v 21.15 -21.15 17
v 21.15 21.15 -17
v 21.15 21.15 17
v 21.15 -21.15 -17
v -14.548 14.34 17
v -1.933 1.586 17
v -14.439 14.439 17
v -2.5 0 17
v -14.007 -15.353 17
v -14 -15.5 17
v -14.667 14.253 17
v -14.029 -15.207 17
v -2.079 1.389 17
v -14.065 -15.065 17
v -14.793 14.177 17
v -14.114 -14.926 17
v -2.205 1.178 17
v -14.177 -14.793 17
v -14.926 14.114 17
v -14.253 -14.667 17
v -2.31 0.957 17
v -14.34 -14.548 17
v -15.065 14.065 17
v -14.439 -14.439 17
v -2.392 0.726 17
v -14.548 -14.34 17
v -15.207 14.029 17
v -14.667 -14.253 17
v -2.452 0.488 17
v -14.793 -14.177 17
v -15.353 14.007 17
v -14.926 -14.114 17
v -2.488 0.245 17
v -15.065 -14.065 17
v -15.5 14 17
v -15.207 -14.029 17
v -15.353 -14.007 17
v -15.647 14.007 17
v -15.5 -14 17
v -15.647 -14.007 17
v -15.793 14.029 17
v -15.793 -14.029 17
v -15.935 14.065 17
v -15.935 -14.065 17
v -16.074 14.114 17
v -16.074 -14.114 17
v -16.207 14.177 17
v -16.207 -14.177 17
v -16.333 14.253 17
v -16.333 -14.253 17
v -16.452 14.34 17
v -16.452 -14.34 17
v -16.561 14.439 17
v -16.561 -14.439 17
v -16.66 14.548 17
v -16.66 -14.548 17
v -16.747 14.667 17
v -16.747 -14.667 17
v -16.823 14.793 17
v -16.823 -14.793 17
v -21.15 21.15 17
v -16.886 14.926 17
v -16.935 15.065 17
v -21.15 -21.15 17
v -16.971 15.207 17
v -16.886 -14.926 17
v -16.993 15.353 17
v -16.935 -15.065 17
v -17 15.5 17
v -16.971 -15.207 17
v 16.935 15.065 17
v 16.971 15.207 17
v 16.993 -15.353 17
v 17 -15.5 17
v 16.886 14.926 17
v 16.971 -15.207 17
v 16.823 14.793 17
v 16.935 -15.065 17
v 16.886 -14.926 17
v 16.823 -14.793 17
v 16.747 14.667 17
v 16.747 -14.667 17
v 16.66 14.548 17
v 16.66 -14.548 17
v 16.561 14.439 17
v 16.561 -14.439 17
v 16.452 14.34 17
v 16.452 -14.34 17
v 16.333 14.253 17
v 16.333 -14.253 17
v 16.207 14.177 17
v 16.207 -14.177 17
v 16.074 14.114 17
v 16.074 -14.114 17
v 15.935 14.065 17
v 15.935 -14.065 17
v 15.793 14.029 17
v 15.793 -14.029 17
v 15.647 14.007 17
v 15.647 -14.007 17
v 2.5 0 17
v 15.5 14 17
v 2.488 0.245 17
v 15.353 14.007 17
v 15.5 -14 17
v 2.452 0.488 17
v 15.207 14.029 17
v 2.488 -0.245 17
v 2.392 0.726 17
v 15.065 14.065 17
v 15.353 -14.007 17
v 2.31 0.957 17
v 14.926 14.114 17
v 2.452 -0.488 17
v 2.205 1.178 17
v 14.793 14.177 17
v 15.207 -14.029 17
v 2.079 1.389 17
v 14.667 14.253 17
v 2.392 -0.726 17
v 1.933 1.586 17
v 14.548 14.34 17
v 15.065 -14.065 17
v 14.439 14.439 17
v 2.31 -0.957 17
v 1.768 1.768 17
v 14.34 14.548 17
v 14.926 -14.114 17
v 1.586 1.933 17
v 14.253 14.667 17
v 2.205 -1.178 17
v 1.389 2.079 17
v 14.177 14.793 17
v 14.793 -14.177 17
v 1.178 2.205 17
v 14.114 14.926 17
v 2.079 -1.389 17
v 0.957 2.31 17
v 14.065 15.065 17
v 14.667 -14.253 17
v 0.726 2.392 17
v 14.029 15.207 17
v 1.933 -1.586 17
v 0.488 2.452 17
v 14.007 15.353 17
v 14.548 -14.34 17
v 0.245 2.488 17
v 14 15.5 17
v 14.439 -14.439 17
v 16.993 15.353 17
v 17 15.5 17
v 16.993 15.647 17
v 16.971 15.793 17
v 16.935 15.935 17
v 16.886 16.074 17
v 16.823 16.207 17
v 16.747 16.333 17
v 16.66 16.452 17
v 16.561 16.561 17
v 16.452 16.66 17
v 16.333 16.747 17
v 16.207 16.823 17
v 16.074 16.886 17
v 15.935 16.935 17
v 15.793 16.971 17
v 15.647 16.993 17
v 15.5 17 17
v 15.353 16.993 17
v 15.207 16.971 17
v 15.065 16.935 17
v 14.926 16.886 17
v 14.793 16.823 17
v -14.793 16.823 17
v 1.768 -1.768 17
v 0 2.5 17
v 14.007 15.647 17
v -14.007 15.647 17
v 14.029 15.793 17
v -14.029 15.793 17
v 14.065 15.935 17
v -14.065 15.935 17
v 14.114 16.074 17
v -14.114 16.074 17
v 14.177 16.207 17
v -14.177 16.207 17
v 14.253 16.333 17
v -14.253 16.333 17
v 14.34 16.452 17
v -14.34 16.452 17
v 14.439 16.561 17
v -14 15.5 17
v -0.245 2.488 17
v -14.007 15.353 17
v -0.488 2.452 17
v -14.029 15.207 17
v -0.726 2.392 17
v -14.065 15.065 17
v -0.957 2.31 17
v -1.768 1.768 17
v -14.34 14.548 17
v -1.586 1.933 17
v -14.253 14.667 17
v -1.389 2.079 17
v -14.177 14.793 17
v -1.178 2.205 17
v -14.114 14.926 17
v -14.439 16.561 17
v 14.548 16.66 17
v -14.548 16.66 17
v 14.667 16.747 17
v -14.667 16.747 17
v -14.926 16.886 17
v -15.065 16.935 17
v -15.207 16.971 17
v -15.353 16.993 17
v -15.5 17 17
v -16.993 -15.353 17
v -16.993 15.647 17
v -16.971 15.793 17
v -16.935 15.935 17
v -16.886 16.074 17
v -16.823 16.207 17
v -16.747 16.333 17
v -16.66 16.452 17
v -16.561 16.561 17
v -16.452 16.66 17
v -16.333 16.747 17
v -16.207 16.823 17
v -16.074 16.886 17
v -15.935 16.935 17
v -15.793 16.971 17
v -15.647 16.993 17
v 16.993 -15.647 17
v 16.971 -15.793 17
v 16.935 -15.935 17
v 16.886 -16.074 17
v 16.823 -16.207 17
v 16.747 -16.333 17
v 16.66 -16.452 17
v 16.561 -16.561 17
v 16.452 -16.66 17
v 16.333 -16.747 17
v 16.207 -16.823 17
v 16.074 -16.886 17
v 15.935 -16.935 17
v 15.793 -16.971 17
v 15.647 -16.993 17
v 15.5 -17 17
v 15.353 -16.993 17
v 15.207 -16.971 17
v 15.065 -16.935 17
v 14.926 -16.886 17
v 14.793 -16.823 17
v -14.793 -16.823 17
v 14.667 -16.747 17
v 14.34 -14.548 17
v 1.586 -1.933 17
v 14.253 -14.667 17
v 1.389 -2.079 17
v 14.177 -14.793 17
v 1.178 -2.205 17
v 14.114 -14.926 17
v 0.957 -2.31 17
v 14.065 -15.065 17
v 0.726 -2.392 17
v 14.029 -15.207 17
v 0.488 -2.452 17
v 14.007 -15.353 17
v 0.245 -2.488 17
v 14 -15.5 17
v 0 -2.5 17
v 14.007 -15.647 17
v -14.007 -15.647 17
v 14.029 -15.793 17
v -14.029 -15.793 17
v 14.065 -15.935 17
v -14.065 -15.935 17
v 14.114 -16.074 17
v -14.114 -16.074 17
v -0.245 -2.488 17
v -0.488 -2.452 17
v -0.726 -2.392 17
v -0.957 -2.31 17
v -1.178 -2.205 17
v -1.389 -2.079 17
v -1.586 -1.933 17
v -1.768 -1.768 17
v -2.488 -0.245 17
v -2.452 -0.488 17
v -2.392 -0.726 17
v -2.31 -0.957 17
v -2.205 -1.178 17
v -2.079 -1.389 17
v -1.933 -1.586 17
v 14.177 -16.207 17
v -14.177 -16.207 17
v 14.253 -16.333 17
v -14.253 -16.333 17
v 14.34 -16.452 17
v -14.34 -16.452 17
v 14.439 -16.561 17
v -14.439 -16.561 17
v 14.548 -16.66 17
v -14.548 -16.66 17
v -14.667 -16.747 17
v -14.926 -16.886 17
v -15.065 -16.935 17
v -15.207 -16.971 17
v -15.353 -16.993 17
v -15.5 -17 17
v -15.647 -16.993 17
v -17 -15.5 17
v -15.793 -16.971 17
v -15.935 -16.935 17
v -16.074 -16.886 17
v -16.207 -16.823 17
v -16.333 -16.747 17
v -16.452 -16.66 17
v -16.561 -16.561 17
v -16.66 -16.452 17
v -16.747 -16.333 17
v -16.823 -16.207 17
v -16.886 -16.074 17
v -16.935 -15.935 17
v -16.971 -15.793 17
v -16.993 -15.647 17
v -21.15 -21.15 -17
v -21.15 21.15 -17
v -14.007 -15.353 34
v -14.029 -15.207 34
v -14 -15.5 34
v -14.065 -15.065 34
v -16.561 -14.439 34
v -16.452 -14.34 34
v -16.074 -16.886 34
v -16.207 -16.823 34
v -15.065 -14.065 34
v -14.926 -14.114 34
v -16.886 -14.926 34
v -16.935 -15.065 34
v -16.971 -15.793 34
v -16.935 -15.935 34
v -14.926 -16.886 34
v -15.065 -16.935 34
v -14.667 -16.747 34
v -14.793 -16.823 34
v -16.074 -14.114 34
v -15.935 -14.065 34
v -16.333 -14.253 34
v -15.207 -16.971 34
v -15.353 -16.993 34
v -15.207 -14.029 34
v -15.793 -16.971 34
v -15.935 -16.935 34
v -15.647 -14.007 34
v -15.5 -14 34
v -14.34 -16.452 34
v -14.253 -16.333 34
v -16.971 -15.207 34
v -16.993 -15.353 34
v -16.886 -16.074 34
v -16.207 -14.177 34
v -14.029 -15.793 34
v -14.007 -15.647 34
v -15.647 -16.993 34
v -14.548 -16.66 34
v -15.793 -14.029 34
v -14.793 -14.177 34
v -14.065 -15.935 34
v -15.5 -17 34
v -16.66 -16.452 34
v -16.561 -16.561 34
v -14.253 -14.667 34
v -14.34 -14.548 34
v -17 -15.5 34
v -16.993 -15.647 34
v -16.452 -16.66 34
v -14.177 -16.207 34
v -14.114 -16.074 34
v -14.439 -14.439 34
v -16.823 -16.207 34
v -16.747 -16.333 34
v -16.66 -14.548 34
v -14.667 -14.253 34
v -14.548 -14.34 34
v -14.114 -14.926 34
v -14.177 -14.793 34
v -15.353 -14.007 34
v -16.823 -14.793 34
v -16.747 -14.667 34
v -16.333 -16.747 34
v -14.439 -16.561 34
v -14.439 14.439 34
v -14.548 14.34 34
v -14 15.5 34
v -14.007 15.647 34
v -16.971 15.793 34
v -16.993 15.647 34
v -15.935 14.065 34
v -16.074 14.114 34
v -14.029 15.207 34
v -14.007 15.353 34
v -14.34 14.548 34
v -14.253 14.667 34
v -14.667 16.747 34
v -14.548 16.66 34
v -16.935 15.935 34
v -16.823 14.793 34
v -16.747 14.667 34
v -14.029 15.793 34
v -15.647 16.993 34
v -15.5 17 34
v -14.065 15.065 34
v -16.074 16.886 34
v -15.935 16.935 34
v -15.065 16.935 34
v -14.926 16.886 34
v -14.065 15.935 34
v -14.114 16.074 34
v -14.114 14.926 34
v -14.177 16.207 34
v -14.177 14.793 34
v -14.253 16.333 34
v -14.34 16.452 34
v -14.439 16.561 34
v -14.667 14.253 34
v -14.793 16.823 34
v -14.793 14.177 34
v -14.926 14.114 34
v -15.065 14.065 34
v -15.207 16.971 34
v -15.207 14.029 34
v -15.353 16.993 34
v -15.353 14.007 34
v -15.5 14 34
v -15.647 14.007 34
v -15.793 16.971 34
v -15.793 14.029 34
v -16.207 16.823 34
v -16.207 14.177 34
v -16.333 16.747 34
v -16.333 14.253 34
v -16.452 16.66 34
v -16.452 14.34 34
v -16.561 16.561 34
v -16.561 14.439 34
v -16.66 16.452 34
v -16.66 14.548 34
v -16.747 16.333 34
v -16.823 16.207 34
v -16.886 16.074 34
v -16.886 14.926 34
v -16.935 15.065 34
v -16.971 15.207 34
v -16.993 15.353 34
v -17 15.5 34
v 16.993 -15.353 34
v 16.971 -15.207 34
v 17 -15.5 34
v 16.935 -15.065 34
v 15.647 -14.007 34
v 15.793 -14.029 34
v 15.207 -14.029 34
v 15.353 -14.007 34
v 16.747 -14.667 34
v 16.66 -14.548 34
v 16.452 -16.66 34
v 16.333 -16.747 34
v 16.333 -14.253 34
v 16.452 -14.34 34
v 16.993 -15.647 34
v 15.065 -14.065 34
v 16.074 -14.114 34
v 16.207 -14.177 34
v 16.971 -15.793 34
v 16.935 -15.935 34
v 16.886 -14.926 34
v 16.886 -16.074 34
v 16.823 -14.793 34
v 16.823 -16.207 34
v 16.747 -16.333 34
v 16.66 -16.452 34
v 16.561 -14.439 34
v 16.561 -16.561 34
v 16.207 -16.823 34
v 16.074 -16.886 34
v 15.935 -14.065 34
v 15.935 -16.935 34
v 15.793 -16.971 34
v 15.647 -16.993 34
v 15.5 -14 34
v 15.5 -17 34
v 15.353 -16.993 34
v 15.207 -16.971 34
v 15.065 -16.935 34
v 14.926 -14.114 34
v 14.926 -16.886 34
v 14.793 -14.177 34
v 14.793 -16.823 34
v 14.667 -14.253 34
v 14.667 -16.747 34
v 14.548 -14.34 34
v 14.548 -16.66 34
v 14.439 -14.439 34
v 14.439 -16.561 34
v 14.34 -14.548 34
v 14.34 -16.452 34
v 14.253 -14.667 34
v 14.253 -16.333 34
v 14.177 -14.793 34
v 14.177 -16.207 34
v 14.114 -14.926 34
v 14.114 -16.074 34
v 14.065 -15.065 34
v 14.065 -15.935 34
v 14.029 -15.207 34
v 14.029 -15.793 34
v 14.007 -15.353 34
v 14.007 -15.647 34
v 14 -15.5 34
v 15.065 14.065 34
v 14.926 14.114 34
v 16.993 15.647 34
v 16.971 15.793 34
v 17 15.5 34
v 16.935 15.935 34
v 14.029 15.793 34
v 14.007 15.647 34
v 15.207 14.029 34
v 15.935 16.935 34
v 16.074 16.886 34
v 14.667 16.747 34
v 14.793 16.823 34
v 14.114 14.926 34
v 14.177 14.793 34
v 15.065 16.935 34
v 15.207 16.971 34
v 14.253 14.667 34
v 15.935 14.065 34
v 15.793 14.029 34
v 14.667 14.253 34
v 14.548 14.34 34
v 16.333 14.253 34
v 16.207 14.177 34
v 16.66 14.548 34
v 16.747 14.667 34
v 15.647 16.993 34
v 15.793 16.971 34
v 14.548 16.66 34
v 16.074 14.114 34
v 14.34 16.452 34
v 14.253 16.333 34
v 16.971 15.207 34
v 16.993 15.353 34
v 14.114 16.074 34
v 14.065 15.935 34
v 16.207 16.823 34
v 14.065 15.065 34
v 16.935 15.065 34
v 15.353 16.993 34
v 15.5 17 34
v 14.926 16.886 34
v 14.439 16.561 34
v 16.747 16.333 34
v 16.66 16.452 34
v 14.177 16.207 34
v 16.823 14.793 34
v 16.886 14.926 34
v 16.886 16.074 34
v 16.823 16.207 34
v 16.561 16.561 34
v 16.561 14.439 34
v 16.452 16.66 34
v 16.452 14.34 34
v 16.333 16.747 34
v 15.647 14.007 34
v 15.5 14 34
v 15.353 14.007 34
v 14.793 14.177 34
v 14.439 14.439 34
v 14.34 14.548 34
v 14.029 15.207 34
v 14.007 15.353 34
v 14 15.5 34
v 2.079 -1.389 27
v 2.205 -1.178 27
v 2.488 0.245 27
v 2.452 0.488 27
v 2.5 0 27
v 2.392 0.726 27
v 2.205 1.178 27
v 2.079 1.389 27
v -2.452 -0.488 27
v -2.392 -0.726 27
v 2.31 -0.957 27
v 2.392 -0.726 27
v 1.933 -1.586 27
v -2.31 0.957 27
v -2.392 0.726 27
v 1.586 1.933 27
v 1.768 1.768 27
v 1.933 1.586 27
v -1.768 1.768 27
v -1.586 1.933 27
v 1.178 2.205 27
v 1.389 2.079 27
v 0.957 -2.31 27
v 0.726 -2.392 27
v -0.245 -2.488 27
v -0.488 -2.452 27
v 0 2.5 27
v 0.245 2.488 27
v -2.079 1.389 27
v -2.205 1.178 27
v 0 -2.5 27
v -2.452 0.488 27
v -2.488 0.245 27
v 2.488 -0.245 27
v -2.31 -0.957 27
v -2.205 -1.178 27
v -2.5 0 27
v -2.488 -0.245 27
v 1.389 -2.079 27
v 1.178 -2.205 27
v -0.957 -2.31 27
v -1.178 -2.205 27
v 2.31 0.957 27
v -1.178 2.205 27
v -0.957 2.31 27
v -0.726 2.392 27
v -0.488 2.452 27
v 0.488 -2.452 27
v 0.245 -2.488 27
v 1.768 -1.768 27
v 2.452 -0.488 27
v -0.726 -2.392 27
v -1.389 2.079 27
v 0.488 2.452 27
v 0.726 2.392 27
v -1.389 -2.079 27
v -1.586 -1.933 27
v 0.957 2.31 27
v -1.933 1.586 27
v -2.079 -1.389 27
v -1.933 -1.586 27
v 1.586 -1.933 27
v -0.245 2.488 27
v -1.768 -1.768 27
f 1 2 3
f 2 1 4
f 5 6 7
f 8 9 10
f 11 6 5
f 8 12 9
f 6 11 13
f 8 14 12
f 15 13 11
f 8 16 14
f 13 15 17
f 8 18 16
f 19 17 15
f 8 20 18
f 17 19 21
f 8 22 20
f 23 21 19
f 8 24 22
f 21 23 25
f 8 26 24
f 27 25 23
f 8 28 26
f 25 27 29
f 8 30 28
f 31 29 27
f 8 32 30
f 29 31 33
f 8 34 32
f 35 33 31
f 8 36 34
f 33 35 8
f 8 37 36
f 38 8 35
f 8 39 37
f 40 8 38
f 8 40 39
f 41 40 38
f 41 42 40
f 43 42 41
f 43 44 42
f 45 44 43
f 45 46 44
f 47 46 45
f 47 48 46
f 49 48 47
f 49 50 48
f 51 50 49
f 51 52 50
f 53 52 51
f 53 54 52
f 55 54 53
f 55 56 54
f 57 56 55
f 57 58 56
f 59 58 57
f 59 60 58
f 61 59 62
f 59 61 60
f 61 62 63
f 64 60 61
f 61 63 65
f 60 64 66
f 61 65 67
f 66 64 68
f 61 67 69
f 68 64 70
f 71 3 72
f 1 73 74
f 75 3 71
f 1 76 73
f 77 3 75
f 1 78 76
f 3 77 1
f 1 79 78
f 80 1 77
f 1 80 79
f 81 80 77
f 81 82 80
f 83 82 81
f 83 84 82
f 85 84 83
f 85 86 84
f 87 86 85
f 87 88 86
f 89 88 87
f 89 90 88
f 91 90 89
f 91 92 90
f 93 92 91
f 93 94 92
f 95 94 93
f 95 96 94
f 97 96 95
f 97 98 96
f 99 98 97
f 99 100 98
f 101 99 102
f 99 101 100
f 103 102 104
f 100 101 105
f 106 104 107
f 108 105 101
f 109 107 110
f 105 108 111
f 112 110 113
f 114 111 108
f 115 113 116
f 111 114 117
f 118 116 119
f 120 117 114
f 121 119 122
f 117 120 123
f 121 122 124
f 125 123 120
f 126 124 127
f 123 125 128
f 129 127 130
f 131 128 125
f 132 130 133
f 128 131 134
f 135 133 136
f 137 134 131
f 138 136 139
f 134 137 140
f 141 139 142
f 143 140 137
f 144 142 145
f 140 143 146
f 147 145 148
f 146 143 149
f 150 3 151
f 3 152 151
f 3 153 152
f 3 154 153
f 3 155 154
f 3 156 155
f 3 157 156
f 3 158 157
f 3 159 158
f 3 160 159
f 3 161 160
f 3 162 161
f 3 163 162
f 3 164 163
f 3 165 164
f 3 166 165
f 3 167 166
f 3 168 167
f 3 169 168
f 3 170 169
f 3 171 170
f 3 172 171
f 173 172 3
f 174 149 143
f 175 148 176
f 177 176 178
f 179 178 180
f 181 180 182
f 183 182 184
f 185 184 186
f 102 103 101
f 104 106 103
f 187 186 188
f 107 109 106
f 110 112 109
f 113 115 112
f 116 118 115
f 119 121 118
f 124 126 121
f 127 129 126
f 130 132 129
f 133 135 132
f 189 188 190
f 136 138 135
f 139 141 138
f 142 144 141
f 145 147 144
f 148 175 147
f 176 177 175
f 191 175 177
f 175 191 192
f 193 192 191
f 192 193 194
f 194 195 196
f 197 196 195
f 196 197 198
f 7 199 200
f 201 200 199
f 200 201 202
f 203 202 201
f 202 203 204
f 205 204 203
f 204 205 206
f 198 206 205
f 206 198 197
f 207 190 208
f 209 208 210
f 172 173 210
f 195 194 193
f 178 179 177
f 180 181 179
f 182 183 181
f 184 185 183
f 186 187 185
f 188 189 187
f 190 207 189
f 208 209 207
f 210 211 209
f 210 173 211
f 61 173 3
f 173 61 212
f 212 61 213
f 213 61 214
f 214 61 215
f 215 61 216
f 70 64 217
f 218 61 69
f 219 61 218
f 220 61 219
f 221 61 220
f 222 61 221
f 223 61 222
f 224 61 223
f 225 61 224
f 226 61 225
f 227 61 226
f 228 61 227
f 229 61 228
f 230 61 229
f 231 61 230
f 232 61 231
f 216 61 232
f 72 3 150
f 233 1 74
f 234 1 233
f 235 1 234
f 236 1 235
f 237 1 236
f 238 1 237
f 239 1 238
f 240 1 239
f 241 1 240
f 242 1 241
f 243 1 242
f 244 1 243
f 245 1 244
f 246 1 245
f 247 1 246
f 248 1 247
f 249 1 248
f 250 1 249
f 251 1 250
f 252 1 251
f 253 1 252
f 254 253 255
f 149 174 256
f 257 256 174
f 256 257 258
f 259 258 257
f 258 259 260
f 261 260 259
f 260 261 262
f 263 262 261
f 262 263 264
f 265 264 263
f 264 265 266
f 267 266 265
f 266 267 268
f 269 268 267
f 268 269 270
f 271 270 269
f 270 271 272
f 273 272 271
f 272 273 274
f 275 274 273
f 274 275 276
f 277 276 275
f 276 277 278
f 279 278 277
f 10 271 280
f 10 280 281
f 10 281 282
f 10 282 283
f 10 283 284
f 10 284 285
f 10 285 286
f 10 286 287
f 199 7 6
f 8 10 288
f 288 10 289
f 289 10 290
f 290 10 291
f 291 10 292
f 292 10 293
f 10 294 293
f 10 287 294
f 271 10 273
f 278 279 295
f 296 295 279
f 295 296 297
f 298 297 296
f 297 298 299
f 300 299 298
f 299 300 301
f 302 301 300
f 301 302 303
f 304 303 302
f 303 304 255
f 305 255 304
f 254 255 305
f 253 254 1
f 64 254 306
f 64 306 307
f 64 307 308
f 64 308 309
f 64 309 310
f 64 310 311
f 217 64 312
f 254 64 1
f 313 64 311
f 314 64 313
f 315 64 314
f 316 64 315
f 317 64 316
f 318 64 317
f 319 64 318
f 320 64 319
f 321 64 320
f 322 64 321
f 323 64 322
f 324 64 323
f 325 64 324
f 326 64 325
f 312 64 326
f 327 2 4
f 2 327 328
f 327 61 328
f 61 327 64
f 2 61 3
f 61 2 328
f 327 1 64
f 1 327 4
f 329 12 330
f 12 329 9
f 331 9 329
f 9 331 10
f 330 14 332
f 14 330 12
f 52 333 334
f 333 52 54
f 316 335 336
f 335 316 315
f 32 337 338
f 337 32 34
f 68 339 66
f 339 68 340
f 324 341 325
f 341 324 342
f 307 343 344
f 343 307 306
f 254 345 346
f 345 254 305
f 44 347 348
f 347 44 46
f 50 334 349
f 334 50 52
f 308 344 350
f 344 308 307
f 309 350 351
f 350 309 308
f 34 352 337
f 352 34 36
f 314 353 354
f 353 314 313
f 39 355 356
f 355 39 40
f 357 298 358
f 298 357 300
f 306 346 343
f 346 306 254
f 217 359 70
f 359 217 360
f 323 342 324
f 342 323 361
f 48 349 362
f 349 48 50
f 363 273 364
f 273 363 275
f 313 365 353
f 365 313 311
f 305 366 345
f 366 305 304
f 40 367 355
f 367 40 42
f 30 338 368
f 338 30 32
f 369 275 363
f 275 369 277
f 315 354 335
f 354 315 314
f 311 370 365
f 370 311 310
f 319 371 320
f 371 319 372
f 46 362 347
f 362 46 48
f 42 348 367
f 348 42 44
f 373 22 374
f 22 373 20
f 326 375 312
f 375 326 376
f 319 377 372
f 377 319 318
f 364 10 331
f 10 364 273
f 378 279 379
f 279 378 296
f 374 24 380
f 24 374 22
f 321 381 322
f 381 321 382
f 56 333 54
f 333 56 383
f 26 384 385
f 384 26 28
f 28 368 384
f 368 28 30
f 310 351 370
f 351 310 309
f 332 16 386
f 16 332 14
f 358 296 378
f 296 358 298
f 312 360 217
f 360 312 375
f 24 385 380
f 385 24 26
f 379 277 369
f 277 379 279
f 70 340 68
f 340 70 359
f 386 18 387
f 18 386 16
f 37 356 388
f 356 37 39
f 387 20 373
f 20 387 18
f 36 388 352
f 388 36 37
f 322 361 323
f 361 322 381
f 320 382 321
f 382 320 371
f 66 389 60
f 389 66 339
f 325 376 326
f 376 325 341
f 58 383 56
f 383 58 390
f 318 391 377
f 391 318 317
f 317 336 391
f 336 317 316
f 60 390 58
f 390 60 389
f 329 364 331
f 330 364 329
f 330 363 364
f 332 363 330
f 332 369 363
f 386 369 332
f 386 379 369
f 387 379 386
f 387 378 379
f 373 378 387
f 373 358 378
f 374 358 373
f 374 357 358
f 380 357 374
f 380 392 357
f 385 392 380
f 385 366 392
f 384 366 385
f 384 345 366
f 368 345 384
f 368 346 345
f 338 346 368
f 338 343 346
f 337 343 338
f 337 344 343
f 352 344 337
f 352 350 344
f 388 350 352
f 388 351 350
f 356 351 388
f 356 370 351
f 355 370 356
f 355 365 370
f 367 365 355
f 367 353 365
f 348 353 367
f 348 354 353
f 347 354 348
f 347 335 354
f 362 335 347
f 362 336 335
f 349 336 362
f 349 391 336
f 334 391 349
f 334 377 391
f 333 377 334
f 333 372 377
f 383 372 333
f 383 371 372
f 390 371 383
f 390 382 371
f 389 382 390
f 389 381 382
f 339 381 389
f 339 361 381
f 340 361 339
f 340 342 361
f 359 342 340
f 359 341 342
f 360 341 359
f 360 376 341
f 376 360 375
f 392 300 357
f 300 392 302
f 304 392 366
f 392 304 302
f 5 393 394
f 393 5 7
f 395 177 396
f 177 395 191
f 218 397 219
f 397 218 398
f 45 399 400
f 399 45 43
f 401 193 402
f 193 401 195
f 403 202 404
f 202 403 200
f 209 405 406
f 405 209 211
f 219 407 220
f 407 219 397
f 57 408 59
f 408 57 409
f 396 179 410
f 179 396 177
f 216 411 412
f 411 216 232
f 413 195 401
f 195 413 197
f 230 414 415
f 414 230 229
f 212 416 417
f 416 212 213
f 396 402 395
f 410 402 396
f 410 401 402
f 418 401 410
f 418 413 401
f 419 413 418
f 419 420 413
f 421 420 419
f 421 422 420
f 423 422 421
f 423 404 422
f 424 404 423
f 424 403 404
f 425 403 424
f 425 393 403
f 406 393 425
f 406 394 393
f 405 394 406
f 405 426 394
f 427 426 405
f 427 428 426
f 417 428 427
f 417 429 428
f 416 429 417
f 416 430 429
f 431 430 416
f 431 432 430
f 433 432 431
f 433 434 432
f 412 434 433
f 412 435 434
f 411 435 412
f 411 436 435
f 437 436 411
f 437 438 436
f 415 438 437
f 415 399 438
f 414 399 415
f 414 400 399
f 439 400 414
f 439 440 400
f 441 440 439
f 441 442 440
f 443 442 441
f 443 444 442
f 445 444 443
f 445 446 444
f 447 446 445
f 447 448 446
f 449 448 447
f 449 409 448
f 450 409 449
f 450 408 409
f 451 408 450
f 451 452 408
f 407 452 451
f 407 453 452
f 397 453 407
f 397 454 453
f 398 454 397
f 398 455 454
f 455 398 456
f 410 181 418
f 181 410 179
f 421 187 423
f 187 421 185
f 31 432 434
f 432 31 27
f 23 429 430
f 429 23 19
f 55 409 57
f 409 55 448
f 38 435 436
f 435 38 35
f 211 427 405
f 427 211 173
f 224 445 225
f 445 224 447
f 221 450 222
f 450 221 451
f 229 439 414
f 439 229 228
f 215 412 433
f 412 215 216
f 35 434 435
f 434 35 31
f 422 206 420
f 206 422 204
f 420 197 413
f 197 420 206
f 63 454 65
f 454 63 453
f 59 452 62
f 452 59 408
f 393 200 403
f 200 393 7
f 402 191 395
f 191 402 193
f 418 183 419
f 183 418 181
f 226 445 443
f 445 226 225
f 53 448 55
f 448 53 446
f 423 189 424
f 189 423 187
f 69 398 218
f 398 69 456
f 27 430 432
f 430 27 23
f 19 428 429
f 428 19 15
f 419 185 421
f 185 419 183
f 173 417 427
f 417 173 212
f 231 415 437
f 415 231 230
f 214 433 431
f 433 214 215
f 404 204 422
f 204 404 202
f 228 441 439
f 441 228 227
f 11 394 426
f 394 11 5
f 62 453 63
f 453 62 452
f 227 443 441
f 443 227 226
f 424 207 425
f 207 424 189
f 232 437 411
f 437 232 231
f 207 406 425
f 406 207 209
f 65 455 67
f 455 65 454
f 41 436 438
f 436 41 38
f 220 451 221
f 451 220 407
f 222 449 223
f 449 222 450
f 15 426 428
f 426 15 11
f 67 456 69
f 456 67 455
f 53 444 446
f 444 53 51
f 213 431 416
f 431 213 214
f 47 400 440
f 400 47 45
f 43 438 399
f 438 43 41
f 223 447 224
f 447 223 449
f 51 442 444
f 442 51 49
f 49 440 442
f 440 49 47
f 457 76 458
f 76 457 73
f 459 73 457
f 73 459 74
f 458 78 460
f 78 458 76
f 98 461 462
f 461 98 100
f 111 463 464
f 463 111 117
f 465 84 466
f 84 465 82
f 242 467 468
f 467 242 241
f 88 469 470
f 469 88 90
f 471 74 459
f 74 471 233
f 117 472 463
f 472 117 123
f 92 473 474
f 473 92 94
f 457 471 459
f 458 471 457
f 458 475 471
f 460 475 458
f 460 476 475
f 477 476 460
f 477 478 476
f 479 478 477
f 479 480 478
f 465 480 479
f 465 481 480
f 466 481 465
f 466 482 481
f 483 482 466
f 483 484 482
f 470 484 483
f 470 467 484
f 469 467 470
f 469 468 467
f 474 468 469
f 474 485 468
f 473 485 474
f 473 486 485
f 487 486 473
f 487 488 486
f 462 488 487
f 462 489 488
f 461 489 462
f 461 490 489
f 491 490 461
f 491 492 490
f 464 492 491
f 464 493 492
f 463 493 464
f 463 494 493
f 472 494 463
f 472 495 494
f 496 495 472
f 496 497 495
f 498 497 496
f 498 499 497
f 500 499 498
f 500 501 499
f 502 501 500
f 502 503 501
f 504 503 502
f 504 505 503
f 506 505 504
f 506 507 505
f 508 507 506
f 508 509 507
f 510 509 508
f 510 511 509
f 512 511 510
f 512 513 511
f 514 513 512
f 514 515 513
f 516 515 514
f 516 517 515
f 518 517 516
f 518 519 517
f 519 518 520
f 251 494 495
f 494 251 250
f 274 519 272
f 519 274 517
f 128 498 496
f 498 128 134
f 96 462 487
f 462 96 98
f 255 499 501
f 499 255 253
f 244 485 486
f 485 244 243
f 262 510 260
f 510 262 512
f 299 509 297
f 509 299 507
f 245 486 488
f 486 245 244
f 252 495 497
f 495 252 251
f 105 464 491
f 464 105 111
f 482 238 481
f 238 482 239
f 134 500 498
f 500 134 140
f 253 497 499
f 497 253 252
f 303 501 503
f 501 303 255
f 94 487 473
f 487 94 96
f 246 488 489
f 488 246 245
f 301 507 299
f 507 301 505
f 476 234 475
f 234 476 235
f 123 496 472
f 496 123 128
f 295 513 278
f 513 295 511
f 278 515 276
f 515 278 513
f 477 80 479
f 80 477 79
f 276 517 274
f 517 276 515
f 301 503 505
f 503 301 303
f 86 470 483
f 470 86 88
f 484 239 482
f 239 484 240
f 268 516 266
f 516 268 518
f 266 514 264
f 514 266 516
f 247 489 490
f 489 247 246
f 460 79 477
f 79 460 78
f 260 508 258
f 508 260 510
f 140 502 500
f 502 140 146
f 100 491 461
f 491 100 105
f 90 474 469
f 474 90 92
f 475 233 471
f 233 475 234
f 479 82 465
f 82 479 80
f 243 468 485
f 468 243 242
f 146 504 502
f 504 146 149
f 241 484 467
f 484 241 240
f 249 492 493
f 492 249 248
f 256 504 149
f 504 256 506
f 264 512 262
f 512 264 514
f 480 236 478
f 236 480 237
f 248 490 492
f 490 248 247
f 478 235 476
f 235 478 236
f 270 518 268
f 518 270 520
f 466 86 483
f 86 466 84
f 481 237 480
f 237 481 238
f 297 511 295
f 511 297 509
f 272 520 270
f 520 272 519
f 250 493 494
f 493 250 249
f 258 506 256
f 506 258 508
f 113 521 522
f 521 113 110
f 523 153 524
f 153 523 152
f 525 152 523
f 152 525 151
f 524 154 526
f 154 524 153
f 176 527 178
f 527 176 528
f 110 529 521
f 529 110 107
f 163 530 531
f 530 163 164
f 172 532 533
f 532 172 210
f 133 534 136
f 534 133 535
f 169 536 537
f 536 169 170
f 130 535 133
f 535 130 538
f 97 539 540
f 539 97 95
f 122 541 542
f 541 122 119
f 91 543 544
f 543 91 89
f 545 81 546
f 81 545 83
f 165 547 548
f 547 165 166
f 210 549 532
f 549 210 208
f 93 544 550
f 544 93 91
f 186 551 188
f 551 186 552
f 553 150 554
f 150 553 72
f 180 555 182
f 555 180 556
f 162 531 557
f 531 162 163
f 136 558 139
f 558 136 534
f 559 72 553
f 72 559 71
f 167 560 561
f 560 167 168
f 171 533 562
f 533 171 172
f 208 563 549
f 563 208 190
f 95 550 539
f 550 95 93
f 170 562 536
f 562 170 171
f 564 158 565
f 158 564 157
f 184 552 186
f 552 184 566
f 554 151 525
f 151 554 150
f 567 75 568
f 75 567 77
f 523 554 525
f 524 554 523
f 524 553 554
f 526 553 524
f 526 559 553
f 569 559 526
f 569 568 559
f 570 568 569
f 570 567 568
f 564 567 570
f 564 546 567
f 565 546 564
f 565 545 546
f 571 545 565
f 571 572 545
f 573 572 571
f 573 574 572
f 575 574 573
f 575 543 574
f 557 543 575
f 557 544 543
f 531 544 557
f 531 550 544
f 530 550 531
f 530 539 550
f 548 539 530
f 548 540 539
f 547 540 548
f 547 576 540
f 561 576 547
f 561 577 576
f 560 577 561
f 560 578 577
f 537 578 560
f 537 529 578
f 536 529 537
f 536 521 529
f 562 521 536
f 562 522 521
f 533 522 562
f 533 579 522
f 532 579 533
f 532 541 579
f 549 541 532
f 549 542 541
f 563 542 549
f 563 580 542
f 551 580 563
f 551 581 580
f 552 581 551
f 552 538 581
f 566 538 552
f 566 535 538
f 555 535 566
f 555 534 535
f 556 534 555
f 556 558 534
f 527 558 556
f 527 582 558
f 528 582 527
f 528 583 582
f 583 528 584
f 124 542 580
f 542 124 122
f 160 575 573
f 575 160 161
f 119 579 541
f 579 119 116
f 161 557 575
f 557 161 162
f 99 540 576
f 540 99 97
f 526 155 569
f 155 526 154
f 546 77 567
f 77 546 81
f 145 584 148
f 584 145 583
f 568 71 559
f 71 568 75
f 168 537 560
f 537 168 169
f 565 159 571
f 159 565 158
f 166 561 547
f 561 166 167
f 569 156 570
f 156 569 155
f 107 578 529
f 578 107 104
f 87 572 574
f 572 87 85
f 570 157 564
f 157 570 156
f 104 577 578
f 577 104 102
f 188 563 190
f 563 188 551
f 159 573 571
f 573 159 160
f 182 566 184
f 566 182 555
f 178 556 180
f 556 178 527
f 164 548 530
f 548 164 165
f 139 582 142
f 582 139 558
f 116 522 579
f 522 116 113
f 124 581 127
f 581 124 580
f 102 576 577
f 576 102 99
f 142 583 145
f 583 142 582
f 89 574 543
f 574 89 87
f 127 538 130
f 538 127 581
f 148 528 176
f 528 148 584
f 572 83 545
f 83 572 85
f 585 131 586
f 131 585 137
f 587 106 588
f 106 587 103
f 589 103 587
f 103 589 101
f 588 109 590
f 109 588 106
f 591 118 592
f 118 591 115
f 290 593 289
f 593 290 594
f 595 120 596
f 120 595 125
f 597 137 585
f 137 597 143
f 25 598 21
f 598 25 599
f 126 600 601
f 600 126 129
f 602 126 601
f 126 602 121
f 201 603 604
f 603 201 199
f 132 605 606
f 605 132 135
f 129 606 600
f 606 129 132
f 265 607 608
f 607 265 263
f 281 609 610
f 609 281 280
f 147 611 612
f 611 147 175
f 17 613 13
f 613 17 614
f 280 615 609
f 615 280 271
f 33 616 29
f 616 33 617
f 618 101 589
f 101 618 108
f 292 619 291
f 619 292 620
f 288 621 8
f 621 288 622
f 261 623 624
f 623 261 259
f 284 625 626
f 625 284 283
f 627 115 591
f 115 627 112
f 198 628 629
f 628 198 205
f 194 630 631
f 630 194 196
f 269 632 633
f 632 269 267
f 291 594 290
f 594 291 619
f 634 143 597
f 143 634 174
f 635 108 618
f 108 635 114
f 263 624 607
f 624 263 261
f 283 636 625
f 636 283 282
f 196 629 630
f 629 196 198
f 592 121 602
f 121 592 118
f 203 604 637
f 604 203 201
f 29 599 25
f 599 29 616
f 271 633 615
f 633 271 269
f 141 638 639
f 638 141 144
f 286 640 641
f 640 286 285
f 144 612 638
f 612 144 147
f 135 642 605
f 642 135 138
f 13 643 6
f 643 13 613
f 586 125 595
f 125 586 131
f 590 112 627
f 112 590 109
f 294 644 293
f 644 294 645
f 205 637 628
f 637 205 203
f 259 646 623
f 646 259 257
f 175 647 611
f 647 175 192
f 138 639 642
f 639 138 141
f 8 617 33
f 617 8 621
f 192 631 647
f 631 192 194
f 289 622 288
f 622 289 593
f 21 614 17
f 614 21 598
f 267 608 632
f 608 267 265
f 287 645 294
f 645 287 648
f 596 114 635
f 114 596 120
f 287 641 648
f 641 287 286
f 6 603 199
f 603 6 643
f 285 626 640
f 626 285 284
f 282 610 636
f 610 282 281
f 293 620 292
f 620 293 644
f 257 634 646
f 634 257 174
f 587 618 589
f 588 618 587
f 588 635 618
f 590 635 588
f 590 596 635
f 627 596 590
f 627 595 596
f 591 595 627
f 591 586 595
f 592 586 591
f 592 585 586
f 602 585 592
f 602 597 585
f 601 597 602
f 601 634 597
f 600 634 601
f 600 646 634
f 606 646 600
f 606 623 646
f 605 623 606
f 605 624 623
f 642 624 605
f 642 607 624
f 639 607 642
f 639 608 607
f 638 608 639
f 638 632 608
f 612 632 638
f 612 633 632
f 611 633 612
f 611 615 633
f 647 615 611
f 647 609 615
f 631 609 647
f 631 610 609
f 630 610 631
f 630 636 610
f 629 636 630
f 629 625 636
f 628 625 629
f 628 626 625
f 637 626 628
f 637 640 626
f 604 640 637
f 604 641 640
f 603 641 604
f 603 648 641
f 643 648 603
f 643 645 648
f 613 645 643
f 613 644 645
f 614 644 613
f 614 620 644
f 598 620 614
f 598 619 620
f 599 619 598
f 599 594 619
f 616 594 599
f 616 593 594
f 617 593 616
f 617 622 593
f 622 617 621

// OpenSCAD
module stepper_motor() {
    // Motor body
    difference() {
        cube([42.3, 42.3, 34.0], center=true);
        // Shaft hole
        translate([0, 0, 17.0])
            cylinder(h=34.0, d=5.0, $fn=64);
    }
    
    // Shaft
    translate([0, 0, 17.0])
        cylinder(h=10.0, d=5.0, $fn=64);
    
    // Mounting holes
    for (x = [-15.5, 15.5])
        for (y = [-15.5, 15.5])
            translate([x, y, 0])
                cylinder(h=34.0, d=3.0, $fn=64);
}

stepper_motor();
